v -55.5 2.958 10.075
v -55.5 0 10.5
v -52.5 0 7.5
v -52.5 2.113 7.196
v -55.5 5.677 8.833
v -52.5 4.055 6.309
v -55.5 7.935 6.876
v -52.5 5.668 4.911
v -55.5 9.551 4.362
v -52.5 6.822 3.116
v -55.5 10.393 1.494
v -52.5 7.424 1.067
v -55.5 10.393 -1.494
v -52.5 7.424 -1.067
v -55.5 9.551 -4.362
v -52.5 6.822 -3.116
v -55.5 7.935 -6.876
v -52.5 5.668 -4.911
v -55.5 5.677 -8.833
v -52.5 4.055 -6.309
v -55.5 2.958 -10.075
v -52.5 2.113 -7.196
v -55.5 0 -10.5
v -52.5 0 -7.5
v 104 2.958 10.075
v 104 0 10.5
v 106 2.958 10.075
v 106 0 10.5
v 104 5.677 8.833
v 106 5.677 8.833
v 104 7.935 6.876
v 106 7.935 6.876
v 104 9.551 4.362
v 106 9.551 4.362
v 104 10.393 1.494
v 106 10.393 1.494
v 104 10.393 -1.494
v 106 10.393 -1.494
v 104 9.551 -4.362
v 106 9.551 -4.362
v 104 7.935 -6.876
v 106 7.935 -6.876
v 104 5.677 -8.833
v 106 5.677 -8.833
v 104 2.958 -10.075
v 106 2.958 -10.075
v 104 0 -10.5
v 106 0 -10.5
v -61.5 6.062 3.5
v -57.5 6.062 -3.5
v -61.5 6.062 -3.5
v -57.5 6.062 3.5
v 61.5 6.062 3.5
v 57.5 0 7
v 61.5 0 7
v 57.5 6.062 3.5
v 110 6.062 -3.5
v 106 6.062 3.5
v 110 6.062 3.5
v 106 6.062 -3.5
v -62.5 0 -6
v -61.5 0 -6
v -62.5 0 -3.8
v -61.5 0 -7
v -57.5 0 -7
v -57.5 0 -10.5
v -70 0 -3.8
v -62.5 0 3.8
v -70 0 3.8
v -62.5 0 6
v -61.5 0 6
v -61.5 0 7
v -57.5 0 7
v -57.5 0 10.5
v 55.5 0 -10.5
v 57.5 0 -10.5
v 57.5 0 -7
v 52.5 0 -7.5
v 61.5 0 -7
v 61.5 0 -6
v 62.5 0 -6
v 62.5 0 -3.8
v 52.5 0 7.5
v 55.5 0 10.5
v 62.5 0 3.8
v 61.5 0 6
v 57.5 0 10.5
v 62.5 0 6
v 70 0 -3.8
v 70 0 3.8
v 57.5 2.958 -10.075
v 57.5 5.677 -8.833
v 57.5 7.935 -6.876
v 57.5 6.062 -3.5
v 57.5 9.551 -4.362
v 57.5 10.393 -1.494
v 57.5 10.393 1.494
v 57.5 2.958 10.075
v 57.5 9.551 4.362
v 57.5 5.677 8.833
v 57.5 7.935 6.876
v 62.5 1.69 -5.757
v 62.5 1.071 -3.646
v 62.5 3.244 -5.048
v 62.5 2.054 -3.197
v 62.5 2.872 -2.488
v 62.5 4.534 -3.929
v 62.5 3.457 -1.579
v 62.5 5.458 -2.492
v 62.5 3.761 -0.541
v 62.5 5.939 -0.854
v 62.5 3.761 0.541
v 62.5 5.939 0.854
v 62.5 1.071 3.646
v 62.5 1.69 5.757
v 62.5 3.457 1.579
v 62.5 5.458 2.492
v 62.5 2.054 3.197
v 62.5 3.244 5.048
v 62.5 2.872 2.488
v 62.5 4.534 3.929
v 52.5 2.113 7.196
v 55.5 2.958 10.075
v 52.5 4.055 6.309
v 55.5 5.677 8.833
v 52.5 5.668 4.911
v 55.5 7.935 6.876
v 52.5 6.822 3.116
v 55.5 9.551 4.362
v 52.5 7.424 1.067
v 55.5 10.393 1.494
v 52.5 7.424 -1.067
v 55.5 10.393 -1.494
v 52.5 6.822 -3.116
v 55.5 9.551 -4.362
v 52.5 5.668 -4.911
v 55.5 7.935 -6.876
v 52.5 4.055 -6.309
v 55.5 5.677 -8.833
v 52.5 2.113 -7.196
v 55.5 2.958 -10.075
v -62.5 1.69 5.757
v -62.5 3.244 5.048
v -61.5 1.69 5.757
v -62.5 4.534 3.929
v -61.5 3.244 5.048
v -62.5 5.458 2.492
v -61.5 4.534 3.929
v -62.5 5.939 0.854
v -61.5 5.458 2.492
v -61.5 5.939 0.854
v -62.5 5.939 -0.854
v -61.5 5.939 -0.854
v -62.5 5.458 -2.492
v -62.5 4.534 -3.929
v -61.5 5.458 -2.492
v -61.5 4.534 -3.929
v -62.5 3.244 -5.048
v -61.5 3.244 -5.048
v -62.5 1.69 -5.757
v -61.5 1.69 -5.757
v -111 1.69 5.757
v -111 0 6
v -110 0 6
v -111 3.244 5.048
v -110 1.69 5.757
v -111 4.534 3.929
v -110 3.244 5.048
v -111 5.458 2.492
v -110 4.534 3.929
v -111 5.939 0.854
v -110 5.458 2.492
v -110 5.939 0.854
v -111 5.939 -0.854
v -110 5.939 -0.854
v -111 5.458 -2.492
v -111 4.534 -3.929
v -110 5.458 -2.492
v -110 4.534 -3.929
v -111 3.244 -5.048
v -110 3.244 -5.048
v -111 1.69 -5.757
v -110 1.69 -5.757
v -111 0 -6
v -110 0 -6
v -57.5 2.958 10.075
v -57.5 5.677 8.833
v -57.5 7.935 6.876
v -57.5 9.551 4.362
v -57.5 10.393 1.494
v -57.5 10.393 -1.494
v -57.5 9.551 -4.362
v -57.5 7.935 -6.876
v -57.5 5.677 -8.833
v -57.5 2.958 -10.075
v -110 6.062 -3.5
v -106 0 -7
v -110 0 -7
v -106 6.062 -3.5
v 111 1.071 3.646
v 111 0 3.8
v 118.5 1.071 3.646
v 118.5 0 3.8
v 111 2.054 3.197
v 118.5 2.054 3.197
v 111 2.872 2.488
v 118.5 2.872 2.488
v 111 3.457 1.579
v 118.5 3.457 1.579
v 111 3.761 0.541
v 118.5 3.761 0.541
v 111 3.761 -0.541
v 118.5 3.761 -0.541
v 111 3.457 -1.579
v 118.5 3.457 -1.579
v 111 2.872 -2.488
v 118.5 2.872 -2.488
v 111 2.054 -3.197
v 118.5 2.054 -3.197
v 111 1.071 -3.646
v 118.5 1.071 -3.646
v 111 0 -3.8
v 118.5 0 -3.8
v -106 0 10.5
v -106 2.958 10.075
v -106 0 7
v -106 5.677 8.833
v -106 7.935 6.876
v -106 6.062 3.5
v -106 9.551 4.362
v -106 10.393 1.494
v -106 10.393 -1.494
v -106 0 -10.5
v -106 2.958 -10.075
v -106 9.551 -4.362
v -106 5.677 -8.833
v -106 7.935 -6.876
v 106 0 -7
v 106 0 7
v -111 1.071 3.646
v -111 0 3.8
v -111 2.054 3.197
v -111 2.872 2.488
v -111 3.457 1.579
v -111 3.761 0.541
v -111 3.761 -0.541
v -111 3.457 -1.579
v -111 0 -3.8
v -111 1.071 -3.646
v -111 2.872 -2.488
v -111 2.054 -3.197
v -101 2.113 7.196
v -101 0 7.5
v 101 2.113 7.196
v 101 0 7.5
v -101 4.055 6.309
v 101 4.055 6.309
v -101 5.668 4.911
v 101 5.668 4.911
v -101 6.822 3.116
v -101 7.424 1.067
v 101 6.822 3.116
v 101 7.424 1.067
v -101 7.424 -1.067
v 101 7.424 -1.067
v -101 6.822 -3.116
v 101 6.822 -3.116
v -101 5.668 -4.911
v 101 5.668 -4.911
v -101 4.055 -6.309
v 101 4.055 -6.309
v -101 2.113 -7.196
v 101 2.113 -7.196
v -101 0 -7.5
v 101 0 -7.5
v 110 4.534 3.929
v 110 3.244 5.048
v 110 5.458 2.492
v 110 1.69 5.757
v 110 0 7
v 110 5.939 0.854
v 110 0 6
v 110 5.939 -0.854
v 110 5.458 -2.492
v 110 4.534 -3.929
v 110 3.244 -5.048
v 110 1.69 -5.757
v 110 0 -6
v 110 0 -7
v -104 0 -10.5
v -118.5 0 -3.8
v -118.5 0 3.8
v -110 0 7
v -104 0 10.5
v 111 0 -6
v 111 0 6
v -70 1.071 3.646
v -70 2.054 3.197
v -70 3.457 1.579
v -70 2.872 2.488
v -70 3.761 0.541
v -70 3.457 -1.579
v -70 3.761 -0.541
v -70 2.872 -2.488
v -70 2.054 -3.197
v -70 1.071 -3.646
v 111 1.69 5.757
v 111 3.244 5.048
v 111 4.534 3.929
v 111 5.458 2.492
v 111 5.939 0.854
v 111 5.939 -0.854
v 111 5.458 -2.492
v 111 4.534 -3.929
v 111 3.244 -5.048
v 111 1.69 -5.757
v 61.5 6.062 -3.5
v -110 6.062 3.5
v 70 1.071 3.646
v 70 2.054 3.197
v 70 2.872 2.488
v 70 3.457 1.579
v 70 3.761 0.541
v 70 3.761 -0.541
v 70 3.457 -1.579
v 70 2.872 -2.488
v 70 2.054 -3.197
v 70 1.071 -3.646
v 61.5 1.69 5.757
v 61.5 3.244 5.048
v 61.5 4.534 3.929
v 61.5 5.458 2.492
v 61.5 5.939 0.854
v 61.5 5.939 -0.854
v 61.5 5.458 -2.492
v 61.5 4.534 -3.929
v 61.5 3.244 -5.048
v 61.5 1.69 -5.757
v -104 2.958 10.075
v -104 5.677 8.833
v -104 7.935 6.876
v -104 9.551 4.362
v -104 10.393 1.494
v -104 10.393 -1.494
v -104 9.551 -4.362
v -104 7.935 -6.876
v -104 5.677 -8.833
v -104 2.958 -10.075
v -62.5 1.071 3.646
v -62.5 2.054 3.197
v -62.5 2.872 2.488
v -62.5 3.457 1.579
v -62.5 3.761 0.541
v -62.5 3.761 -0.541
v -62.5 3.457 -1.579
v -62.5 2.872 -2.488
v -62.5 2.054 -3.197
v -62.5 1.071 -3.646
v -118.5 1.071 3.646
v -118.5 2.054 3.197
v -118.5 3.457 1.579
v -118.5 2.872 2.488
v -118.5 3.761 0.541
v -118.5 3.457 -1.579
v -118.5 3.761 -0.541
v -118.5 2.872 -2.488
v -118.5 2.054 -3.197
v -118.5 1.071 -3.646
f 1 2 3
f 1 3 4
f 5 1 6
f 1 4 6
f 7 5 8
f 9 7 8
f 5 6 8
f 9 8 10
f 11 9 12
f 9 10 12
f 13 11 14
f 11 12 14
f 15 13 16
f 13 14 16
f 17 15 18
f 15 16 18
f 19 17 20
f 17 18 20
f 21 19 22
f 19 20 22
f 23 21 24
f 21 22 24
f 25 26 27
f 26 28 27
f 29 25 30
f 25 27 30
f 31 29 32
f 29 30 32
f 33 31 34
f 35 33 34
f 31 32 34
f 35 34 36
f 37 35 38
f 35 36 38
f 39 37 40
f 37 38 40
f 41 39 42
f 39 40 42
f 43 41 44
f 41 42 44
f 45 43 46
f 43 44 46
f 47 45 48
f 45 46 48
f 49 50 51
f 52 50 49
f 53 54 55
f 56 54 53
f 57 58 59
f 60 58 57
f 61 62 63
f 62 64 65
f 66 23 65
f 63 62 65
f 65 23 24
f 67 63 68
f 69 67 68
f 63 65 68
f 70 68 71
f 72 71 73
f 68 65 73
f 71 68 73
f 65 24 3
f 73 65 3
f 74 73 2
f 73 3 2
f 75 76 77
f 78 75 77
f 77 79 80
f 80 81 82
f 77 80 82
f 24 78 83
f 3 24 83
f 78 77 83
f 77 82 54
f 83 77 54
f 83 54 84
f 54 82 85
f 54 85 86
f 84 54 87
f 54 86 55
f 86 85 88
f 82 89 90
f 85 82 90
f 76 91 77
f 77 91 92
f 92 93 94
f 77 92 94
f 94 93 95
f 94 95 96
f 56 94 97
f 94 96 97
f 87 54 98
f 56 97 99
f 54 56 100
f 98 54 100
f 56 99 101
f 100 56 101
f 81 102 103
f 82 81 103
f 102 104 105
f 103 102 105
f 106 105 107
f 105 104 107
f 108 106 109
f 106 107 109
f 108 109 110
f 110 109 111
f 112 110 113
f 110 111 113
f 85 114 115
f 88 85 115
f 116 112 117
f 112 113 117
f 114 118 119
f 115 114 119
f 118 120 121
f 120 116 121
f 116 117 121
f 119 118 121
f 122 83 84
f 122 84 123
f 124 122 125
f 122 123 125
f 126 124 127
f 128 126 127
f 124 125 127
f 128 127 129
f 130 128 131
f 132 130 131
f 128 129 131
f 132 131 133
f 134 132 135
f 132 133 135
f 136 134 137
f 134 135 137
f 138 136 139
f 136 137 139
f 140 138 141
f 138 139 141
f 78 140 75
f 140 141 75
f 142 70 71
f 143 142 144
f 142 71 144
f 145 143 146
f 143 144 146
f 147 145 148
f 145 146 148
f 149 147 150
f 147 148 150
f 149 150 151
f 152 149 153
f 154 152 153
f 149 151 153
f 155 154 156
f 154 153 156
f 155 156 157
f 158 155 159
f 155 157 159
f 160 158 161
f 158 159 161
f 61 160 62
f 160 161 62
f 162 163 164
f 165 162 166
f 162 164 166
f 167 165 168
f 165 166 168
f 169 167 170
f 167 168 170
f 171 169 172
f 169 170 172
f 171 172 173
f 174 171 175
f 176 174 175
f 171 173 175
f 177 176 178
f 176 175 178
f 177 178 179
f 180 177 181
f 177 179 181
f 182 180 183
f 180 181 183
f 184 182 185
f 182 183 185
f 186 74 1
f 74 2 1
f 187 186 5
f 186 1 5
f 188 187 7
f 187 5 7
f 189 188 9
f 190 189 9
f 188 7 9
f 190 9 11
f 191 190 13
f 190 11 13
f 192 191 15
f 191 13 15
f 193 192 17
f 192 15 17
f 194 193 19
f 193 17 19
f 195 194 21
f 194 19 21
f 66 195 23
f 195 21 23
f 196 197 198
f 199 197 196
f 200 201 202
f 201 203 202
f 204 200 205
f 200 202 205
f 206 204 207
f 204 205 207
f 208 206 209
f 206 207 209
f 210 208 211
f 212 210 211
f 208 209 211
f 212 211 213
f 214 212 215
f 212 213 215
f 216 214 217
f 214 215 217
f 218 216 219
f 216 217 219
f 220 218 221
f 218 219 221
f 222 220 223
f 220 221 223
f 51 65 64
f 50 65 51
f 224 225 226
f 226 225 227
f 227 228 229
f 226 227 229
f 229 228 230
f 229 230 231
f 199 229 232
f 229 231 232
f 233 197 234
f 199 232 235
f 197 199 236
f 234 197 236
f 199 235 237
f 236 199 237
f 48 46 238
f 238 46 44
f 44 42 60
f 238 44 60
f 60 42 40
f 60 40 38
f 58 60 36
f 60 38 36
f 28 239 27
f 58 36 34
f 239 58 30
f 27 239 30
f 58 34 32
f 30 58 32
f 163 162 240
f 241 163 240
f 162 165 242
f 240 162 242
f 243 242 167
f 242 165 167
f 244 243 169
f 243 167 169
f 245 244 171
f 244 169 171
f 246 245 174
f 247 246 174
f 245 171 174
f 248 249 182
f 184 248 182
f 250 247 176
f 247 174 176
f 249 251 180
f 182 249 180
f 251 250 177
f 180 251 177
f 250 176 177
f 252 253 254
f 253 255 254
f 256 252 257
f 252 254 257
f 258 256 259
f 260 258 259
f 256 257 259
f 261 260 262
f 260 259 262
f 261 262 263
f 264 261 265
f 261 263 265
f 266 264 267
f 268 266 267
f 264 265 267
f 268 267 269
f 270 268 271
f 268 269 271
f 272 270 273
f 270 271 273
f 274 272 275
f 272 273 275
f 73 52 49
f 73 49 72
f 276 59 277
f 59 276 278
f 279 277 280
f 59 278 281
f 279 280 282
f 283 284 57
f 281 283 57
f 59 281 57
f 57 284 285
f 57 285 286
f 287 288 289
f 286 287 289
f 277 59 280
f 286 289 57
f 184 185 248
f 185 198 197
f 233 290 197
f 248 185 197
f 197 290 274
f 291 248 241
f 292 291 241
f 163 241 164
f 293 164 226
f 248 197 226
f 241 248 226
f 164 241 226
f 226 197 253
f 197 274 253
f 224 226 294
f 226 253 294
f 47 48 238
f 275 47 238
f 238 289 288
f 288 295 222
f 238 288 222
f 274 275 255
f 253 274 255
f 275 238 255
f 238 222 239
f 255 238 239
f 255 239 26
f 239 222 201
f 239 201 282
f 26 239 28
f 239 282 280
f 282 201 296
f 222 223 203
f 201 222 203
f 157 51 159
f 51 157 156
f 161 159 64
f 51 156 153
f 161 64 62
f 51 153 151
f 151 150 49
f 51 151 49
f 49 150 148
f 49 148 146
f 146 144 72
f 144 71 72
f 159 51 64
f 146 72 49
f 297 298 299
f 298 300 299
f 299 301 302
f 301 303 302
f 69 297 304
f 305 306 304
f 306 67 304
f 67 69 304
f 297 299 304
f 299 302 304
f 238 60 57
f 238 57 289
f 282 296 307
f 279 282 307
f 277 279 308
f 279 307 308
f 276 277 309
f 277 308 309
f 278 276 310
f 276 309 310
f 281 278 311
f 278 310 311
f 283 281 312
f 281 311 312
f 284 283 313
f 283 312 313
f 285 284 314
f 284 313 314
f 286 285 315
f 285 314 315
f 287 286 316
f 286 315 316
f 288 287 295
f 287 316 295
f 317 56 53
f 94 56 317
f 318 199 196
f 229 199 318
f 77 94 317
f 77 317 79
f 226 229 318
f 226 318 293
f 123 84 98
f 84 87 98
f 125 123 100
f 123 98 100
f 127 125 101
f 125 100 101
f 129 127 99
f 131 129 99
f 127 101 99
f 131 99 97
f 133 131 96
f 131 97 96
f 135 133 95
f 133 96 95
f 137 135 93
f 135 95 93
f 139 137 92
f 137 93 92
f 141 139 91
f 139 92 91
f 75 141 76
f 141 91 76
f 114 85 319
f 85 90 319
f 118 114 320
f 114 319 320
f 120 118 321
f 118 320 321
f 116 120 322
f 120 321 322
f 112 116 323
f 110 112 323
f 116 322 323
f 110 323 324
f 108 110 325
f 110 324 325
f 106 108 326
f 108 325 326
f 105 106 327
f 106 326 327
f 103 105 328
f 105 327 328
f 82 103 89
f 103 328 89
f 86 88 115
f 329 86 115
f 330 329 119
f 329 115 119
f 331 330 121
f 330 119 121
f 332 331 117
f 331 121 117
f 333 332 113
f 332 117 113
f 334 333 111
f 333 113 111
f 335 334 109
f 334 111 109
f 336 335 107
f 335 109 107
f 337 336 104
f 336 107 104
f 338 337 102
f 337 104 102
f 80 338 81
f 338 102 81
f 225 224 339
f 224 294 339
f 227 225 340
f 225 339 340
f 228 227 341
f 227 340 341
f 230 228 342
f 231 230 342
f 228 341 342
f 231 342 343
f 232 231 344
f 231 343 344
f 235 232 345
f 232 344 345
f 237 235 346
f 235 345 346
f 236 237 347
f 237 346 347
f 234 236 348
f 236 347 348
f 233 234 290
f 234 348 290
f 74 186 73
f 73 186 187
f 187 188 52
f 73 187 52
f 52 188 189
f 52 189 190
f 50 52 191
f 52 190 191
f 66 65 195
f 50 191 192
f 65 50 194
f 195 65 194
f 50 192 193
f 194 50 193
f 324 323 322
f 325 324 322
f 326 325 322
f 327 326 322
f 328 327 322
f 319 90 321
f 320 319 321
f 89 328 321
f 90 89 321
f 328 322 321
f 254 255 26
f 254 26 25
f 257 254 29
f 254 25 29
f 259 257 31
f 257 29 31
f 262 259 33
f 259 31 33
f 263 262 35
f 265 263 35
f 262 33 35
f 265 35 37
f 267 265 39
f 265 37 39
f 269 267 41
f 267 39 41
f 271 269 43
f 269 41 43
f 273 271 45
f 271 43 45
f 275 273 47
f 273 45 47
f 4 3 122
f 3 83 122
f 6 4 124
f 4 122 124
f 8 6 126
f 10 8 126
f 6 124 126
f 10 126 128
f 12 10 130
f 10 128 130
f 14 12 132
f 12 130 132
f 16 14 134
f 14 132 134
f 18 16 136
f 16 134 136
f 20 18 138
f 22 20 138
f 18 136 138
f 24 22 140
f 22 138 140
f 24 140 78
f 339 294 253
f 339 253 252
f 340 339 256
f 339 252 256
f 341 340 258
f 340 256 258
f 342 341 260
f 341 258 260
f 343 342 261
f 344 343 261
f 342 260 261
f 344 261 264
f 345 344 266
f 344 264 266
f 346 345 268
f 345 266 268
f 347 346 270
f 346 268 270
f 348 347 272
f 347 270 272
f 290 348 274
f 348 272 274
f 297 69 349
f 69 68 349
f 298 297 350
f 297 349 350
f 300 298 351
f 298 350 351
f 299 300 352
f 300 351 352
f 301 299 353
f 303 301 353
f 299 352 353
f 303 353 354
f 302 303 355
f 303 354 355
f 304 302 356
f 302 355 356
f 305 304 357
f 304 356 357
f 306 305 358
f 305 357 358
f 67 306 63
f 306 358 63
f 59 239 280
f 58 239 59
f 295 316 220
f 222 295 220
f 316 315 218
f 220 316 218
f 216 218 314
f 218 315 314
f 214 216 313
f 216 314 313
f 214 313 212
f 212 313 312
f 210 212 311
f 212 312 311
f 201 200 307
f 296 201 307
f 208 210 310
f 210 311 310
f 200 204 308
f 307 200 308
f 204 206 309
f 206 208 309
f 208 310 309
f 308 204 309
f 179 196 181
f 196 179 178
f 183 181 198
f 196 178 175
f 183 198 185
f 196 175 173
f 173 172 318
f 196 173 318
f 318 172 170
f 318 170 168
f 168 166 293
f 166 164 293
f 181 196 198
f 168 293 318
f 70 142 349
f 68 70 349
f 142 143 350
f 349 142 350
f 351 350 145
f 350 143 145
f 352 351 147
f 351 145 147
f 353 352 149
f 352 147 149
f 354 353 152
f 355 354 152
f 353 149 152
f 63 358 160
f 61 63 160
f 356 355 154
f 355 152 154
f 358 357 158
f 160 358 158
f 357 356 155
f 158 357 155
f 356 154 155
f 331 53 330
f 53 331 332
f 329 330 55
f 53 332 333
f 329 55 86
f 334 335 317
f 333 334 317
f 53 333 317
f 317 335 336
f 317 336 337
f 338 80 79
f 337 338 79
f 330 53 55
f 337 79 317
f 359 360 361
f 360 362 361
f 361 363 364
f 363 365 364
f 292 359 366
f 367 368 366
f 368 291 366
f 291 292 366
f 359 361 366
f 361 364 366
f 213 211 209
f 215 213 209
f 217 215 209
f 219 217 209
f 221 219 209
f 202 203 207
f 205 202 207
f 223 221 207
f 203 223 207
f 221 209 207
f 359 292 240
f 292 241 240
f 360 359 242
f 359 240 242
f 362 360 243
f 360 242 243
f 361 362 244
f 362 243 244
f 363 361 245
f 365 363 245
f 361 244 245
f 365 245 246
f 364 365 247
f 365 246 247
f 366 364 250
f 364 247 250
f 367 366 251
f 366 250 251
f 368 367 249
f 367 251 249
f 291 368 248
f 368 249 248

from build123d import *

# Parameters (mm, degrees)
REVOLUTION_ANGLE    = -180
PAD_DEPTH           = 4
PAD004_DEPTH        = 4
REVOLUTION001_ANGLE = -180
PAD002_DEPTH        = 4
PAD003_DEPTH        = 4


with BuildPart() as body:
    # Sketch → Revolution (revolve)
    with BuildSketch(Plane.XZ):
        Polygon((-70, 0), (-70, 3.8), (-62.5, 3.8), (-62.5, 6), (-57.5, 6), (-57.5, 10.5), (-55.5, 10.5), (-52.5, 7.5), (52.5, 7.5), (55.5, 10.5), (57.5, 10.5), (57.5, 6), (62.5, 6), (62.5, 3.8), (70, 3.8), (70, 0), align=None)
    revolve(axis=Axis((0, 0, 0), (1, 0, 0)), revolution_arc=REVOLUTION_ANGLE)

    # Sketch002 (on Face11 of Revolution) → Pad (new body)
    with BuildSketch(Plane(origin=(57.5, 0, 0), x_dir=(0, 0, 1), z_dir=(1, 0, 0))):
        Polygon((0, 0), (7, 0), (3.5, -6.062178), (-3.5, -6.062178), (-7, 0), align=None)
    extrude(amount=PAD_DEPTH)

    # Sketch007 (on Face5 of Revolution) → Pad004 (join)
    with BuildSketch(Plane(origin=(-57.5, 0, 0), x_dir=(0, 0, -1), z_dir=(-1, 0, 0))):
        Polygon((0, 0), (7, 0), (3.5, -6.062178), (-3.5, -6.062178), (-7, 0), align=None)
    extrude(amount=PAD004_DEPTH)


with BuildPart() as body001:
    # Sketch003 → Revolution001 (revolve)
    with BuildSketch(Plane.XZ):
        Polygon((-118.5, 0), (-118.5, 3.8), (-111, 3.8), (-111, 6), (-106, 6), (-106, 10.5), (-104, 10.5), (-101, 7.5), (101, 7.5), (104, 10.5), (106, 10.5), (106, 6), (111, 6), (111, 3.8), (118.5, 3.8), (118.5, 0), align=None)
    revolve(axis=Axis((0, 0, 0), (1, 0, 0)), revolution_arc=REVOLUTION001_ANGLE)

    # Sketch005 (on Face11 of Revolution001) → Pad002 (new body)
    with BuildSketch(Plane(origin=(106, 0, 0), x_dir=(0, 0, 1), z_dir=(1, 0, 0))):
        Polygon((0, 0), (7, 0), (3.5, -6.062178), (-3.5, -6.062178), (-7, 0), align=None)
    extrude(amount=PAD002_DEPTH)

    # Sketch006 (on Face5 of Revolution001) → Pad003 (join)
    with BuildSketch(Plane(origin=(-106, 0, 0), x_dir=(0, 0, -1), z_dir=(-1, 0, 0))):
        Polygon((0, 0), (7, 0), (3.5, -6.062178), (-3.5, -6.062178), (-7, 0), align=None)
    extrude(amount=PAD003_DEPTH)


solid = Compound([body.part, body001.part])
